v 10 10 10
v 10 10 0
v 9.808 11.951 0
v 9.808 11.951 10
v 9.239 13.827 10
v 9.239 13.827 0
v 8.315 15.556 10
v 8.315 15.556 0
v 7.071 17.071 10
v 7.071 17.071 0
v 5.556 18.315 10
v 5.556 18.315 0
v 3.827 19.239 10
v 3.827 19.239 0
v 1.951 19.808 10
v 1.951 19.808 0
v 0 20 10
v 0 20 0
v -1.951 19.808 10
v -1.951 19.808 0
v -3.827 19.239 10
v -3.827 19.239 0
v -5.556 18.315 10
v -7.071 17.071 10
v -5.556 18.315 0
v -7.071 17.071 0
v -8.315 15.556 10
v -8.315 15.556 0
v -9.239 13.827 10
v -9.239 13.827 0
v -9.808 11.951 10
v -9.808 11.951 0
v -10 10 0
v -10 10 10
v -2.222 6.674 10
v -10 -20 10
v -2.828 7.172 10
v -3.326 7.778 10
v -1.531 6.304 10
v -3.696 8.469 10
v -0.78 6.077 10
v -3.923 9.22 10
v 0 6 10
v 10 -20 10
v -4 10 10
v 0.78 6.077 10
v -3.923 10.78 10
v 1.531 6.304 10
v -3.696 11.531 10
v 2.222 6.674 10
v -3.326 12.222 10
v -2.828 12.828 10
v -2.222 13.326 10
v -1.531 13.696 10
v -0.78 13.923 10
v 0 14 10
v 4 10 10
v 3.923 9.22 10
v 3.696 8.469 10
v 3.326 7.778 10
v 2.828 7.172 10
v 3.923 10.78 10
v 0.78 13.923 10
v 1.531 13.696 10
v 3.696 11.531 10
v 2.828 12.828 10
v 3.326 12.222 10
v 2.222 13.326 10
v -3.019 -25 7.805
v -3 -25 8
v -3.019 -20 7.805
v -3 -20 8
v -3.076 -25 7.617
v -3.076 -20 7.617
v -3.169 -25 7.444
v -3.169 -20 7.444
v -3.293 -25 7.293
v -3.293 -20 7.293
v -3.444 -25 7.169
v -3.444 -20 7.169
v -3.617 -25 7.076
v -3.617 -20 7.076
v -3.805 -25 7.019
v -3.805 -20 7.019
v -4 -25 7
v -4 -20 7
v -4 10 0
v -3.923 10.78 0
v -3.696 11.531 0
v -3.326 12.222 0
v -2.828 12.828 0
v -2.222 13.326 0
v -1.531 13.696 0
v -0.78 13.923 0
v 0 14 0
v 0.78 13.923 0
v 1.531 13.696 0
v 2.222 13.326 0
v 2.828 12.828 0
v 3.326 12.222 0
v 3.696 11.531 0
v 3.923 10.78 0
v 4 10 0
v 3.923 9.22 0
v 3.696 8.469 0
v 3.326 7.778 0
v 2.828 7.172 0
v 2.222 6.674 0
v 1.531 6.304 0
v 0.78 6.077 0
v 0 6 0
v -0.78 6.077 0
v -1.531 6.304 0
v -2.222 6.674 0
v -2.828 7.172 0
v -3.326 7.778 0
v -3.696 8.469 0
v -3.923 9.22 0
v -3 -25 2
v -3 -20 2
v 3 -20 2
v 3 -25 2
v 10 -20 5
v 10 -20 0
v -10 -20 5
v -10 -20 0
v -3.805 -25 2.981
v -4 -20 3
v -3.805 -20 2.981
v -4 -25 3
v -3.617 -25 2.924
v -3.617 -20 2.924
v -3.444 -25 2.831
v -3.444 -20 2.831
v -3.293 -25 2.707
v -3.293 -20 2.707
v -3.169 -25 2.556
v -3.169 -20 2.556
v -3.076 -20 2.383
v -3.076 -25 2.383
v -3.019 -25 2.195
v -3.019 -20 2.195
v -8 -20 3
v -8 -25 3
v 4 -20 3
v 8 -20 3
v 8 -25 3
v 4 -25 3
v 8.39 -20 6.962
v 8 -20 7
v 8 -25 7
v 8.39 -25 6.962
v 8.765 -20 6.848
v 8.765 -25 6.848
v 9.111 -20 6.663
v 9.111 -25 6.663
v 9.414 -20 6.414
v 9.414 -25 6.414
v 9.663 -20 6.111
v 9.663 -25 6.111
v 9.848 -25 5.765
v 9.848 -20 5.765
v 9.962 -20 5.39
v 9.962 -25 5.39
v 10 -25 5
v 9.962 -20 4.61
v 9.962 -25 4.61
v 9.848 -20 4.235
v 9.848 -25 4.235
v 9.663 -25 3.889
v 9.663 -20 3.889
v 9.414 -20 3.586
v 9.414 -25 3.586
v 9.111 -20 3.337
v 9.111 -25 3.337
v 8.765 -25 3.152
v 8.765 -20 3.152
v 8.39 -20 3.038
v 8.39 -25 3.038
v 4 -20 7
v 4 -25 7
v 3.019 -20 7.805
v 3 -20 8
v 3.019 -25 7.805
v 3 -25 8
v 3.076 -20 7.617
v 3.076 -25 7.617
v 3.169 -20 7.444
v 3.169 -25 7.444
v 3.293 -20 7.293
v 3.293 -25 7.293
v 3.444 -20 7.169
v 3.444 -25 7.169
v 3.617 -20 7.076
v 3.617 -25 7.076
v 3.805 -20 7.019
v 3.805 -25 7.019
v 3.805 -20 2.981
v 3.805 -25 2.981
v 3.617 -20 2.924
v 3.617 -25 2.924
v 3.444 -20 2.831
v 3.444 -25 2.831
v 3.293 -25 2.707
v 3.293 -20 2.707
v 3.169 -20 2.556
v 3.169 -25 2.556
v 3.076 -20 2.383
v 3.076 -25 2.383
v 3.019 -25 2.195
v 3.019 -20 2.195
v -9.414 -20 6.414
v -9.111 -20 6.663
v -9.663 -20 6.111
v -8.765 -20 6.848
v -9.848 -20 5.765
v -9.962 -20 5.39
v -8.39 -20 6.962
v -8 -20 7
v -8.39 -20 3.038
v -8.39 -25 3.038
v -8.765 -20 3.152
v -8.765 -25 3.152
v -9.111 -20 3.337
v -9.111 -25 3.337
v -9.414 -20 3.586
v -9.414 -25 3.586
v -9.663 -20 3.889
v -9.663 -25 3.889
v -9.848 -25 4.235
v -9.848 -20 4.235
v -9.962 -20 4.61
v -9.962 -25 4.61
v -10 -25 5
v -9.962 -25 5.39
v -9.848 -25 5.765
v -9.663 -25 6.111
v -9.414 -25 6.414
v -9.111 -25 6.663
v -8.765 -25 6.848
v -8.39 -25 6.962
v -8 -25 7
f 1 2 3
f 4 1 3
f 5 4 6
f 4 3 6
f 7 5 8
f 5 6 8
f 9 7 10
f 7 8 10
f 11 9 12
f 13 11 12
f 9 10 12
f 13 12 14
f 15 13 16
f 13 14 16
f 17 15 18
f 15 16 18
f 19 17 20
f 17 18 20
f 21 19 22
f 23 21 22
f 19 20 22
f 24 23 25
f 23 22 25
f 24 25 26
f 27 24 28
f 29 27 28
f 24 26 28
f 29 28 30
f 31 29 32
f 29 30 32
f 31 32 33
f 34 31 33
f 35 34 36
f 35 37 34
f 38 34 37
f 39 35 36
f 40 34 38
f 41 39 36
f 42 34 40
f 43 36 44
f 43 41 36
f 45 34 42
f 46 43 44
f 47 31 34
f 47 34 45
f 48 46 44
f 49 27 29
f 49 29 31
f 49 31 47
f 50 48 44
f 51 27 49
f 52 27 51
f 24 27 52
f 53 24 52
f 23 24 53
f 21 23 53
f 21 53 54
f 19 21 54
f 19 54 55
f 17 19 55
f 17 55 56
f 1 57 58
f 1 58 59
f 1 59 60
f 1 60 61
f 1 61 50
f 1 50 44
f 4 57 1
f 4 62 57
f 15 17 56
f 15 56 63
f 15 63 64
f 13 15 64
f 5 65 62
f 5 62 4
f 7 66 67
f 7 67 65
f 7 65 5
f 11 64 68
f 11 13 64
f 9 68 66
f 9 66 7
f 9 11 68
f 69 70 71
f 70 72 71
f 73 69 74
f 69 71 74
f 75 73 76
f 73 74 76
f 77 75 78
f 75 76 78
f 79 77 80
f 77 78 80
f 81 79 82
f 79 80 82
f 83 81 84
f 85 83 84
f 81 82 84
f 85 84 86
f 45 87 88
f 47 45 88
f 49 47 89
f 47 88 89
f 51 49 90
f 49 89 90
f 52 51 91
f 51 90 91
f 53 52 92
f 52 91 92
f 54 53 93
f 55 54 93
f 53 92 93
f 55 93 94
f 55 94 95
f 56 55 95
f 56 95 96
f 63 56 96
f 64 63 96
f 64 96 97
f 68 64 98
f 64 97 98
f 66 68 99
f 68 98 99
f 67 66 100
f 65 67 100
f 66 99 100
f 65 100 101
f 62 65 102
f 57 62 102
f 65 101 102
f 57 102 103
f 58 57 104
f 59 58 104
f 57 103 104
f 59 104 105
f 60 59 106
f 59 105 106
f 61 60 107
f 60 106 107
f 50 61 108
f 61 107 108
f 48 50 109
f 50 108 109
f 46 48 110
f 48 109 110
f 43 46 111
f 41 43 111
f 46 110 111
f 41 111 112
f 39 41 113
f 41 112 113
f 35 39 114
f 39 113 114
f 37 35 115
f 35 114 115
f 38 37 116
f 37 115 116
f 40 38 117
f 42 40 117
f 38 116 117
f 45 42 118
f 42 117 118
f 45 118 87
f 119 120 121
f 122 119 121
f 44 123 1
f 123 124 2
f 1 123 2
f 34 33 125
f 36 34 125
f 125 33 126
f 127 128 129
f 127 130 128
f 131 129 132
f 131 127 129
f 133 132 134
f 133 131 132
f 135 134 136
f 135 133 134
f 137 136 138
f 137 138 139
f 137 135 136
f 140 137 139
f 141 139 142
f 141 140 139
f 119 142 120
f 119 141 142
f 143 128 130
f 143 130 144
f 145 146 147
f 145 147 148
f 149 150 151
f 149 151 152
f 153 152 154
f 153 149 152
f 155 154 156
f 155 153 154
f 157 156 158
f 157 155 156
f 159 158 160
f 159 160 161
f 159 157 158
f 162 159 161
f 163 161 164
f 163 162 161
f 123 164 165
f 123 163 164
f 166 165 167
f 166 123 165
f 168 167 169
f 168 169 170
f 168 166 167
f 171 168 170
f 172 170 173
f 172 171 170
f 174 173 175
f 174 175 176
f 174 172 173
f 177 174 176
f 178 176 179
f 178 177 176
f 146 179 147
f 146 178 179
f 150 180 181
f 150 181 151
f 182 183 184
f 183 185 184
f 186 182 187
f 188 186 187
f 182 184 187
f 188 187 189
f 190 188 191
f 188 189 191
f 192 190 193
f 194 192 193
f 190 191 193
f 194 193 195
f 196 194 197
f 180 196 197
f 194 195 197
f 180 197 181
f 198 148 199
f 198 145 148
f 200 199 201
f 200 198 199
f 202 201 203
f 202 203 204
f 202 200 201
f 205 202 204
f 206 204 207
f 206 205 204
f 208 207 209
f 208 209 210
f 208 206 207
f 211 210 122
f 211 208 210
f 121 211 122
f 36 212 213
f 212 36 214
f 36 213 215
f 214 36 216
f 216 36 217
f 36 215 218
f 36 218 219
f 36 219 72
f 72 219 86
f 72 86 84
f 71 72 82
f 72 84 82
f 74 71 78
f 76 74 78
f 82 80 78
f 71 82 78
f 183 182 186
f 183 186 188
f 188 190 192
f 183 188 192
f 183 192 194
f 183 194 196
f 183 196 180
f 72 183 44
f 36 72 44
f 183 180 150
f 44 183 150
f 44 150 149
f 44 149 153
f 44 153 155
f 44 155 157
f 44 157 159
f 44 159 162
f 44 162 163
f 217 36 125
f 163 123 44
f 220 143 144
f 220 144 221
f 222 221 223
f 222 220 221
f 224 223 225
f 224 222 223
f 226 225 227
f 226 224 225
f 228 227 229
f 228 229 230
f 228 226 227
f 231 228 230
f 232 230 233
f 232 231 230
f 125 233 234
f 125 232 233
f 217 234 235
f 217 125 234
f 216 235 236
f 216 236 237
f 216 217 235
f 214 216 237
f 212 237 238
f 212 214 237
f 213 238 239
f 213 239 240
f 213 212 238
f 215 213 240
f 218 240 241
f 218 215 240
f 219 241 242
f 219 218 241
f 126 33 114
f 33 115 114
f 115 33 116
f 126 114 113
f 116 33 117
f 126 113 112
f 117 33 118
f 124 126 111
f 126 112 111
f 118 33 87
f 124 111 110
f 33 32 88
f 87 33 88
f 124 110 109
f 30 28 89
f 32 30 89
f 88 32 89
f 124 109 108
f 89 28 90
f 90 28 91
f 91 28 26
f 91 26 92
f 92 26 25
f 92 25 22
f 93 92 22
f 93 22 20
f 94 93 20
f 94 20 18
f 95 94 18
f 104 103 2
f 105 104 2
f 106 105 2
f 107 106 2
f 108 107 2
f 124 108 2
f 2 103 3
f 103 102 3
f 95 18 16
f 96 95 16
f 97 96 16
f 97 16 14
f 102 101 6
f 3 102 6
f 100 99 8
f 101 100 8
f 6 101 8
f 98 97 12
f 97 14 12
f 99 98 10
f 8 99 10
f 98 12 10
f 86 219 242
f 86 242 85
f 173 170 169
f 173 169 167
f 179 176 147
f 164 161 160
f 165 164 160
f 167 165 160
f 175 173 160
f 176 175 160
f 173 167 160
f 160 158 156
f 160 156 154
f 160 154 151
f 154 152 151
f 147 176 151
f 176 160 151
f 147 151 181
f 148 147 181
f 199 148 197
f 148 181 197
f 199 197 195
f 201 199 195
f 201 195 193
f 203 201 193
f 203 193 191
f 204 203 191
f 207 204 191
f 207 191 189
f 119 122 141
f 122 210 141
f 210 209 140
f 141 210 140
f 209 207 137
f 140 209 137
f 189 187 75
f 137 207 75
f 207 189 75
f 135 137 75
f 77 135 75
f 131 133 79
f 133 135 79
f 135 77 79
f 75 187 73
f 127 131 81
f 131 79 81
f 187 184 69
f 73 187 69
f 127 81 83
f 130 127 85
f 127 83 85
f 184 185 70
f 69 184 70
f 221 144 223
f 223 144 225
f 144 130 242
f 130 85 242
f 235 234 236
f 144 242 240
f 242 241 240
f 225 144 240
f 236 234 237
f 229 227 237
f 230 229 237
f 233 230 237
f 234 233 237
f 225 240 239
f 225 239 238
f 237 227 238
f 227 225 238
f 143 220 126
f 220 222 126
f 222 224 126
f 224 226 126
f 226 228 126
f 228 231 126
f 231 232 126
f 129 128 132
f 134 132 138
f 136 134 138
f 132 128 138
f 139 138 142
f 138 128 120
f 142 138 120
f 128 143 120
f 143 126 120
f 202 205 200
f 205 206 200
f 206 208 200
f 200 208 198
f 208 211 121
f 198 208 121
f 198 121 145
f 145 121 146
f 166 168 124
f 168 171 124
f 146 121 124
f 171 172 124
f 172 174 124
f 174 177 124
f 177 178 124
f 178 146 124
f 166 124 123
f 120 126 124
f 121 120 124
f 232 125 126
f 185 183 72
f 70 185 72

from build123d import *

# Parameters (mm, degrees)
BOSS_EXTRUDE1_DEPTH = 10
SKETCH2_R           = 4
CUT_EXTRUDE1_DEPTH  = 10
BOSS_EXTRUDE2_DEPTH = 5
BOSS_EXTRUDE3_DEPTH = 5
FILLET1_R           = 1


with BuildPart() as part:
    # Sketch1 → Boss-Extrude1 (new body)
    with BuildSketch(Plane.XY):
        with BuildLine():
            Line((-10, -20), (10, -20))
            Line((10, -20), (10, 10))
            ThreePointArc((10, 10), (0, 20), (-10, 10))
            Line((-10, 10), (-10, -20))
        make_face()
    extrude(amount=BOSS_EXTRUDE1_DEPTH)

    # Sketch2 → Cut-Extrude1 (cut)
    with BuildSketch(Plane(origin=(0, 0, 0), x_dir=(-1, 0, 0), z_dir=(0, 0, -1))):
        with Locations((0, 10)):
            Circle(SKETCH2_R)
    extrude(amount=-CUT_EXTRUDE1_DEPTH, mode=Mode.SUBTRACT)

    # Sketch3 → Boss-Extrude2 (add)
    with BuildSketch(Plane.XZ.offset(20)):
        with BuildLine():
            Line((-8, 7), (8, 7))
            ThreePointArc((8, 7), (10, 5), (8, 3))
            Line((8, 3), (-8, 3))
            ThreePointArc((-8, 3), (-10, 5), (-8, 7))
        make_face()
    extrude(amount=BOSS_EXTRUDE2_DEPTH)

    # Sketch4 → Boss-Extrude3 (add)
    with BuildSketch(Plane.XZ.offset(20)):
        Polygon((-1.75, 8), (1.75, 8), (3, 8), (3, 6.75), (3, 3.25), (3, 2), (1.75, 2), (-1.75, 2), (-3, 2), (-3, 3.25), (-3, 6.75), (-3, 8), align=None)
    extrude(amount=BOSS_EXTRUDE3_DEPTH)

    # Fillet1
    fillet1_edges = [part.edges().sort_by_distance(p)[0] for p in [
        (3, -22.5, 7),
        (3, -22.5, 3),
        (-3, -22.5, 3),
        (-3, -22.5, 7),
    ]]
    fillet(fillet1_edges, radius=FILLET1_R - 0.0001)  # a hair under: the kernel refuses the full size


solid = part.part
